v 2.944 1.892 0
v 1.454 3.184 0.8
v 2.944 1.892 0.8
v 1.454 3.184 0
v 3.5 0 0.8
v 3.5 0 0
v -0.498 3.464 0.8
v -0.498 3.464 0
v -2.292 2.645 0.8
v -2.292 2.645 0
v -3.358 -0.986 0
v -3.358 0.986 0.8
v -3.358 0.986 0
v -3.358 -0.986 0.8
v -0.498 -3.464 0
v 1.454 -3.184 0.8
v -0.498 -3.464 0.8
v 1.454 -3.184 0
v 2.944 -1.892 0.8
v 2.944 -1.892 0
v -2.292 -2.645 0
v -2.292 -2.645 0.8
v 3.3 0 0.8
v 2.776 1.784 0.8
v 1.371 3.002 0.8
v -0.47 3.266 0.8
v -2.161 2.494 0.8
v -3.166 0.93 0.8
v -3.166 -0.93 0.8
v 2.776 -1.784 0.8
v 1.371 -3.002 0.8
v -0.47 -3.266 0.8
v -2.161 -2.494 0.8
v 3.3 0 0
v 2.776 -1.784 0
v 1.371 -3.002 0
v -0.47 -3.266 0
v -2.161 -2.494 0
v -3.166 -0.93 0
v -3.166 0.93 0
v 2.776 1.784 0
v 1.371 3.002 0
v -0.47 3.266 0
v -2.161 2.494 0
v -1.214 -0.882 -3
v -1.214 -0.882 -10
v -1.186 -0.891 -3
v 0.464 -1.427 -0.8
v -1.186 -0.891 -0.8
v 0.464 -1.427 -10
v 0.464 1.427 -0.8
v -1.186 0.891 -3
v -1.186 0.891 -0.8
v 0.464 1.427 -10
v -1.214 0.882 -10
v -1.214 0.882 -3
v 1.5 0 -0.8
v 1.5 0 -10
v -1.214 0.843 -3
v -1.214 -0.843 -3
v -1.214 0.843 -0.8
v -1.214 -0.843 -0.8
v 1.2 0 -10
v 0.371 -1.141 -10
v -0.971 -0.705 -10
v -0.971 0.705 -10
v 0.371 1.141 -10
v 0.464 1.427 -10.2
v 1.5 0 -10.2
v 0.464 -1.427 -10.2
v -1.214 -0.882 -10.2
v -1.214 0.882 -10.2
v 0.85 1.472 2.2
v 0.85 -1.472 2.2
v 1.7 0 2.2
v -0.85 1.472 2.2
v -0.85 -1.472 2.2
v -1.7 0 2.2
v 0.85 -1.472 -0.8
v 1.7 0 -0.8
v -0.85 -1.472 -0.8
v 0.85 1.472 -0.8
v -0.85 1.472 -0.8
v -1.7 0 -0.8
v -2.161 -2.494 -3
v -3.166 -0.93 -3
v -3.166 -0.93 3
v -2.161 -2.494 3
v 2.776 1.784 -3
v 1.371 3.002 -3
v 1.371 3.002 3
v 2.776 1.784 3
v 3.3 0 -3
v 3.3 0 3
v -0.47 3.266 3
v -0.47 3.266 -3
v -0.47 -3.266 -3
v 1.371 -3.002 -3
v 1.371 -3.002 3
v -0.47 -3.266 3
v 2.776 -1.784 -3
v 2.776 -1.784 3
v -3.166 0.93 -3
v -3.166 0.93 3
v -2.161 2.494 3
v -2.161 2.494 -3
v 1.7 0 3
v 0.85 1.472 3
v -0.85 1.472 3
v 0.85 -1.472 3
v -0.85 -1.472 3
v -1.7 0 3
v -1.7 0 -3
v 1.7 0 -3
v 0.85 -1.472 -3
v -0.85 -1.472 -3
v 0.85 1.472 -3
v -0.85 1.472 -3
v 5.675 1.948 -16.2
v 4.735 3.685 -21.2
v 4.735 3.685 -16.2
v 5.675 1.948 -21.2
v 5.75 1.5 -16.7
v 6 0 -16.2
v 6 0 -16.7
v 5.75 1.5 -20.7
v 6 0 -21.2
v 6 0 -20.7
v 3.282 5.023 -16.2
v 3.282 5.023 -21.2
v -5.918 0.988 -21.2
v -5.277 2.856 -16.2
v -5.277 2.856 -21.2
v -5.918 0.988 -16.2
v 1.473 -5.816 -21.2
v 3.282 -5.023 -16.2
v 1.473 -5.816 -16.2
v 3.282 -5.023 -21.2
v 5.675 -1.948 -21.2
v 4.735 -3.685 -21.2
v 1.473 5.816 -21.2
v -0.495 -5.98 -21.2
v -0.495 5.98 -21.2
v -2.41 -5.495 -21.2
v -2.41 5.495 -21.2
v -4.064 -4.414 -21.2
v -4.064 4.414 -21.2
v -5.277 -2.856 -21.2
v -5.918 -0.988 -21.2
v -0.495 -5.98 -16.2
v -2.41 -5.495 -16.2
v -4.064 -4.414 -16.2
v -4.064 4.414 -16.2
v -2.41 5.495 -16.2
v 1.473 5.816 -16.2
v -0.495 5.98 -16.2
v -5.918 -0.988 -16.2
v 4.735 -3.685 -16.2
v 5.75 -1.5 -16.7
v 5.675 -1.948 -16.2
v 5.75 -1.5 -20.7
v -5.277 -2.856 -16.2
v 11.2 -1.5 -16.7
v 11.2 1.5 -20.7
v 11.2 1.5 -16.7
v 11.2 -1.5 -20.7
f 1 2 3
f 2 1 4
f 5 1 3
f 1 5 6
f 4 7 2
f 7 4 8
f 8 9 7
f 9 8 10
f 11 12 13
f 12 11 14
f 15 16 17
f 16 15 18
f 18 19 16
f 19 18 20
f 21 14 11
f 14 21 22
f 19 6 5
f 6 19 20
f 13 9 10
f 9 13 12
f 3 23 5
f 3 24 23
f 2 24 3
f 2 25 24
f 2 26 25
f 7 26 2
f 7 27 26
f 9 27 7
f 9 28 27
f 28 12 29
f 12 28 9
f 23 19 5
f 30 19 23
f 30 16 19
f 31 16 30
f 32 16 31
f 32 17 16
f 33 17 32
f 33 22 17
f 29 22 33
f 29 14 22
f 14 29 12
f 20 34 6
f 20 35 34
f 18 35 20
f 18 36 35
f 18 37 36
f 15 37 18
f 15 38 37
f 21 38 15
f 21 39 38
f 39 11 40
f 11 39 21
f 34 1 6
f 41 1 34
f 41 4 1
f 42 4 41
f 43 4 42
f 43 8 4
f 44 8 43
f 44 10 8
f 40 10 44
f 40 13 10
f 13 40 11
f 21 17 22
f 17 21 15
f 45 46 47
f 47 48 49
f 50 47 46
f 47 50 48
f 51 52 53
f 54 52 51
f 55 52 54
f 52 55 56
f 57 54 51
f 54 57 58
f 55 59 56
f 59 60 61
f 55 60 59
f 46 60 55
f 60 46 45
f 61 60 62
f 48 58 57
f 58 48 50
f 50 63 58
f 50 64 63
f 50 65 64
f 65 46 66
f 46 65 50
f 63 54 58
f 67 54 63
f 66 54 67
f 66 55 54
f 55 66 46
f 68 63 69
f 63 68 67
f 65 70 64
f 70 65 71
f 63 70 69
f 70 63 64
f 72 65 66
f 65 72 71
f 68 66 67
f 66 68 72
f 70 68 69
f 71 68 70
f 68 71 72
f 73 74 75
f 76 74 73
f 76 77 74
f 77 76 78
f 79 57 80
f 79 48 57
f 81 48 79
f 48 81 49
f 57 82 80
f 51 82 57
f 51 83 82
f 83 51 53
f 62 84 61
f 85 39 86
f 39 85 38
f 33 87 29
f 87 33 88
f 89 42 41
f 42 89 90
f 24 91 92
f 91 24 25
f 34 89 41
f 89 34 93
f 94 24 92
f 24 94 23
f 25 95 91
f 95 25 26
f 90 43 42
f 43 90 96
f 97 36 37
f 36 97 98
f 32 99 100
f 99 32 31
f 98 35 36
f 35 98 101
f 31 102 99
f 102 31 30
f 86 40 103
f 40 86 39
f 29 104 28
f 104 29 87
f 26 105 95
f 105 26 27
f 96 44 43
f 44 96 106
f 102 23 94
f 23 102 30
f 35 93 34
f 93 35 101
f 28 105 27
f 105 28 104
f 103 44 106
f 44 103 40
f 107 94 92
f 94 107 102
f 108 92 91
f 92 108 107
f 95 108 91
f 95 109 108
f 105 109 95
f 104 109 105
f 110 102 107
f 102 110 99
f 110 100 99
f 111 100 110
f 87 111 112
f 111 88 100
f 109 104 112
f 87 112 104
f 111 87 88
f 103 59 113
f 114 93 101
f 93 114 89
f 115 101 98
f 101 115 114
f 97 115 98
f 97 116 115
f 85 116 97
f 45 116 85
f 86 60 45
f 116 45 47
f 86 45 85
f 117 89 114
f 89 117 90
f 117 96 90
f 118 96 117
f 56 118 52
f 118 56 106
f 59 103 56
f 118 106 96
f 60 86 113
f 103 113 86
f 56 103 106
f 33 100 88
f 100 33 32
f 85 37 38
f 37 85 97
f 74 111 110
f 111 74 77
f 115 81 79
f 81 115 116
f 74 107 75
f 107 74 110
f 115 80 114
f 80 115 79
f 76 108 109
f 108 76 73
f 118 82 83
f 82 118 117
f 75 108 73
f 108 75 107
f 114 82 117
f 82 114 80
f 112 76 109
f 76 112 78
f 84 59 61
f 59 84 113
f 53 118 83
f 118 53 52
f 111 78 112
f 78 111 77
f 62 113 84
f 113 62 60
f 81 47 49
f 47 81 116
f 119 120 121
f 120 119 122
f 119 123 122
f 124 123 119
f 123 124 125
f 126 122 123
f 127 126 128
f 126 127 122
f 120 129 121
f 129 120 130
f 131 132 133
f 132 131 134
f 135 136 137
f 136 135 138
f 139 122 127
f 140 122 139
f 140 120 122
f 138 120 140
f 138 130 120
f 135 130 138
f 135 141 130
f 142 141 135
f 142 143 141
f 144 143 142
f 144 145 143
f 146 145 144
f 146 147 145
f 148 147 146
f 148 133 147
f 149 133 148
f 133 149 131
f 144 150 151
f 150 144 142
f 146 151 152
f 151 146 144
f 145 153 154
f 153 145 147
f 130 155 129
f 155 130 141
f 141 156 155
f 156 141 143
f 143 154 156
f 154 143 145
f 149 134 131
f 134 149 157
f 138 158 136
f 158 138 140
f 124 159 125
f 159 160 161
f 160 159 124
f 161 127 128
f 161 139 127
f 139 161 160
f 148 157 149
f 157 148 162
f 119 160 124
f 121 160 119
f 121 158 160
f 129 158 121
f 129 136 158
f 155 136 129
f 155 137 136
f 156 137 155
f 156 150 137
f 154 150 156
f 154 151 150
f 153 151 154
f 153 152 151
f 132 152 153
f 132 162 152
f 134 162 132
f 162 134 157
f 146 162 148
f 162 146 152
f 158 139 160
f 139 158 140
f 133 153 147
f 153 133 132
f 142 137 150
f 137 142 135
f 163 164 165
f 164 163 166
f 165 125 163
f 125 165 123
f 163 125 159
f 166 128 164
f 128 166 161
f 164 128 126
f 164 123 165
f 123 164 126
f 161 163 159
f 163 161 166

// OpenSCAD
// Parameters
thread_diameter_mm = 3; //[1.5:6:0.1]
length_under_head_mm = 10; //[5:20:0.5]
head_diameter_mm = 5.5; //[3:11:0.1]
head_height_mm = 3; //[1.5:6:0.1]
hex_socket_af_mm = 2.5; //[1.5:4:0.1]
hex_socket_depth_mm = 1.6; //[0.8:3:0.1]
tip_cone_height_mm = 1; //[0.5:2:0.1]
overlap_mm = 0.8; //[0.2:2:0.1]
spacer_height_mm = 6; //[3:12:0.5]
spacer_wall_mm = 1.8; //[0.8:3.6:0.1]
washer_outer_diameter_mm = 7; //[4:14:0.1]
washer_thickness_mm = 0.8; //[0.4:1.6:0.1]
buzzer_diameter_mm = 12; //[6:24:0.5]
buzzer_height_mm = 5; //[2.5:10:0.5]
pin_socket_width_mm = 6; //[3:12:0.5]
pin_socket_depth_mm = 3; //[1.5:6:0.5]
pin_socket_height_mm = 4; //[2:8:0.5]

// PCB Spacer - complete geometry
module pcb_spacer() {
  color("Silver") {
    difference() {
      cylinder(r=thread_diameter_mm/2 + spacer_wall_mm, h=spacer_height_mm, center=true);
      translate([0, 0, -overlap_mm])
        cylinder(r=thread_diameter_mm/2 + (overlap_mm/4), h=spacer_height_mm + 2*overlap_mm, center=true);
    }
  }
}

// Screw and Washer - complete geometry
module screw_and_washer() {
  color("DimGray") {
    union() {
      // Screw shaft
      translate([0, 0, -length_under_head_mm/2])
        cylinder(r=thread_diameter_mm/2, h=length_under_head_mm, center=true);
      // Tip
      translate([0, 0, -length_under_head_mm - tip_cone_height_mm/2 + overlap_mm])
        cylinder(r1=thread_diameter_mm/2, r2=0, h=tip_cone_height_mm, center=true);
      // Head
      translate([0, 0, head_height_mm/2 - overlap_mm])
        cylinder(r=head_diameter_mm/2, h=head_height_mm, center=true);
      // Hex socket
      translate([0, 0, head_height_mm - hex_socket_depth_mm/2 - overlap_mm])
        difference() {
          cylinder(r=(hex_socket_af_mm/cos(30))/2, h=hex_socket_depth_mm, center=true);
        }
      // Washer
      translate([0, 0, -washer_thickness_mm/2 + overlap_mm])
        difference() {
          cylinder(r=washer_outer_diameter_mm/2, h=washer_thickness_mm, center=true);
          translate([0, 0, -overlap_mm])
            cylinder(r=thread_diameter_mm/2 + (overlap_mm/4), h=washer_thickness_mm + 2*overlap_mm, center=true);
        }
    }
  }
}

// Buzzer - complete geometry
module buzzer() {
  color("Black") {
    translate([0, 0, -length_under_head_mm - tip_cone_height_mm - spacer_height_mm - buzzer_height_mm/2 + overlap_mm])
      cylinder(r=buzzer_diameter_mm/2, h=buzzer_height_mm, center=true);
  }
}

// Pin Socket - complete geometry
module pin_socket() {
  color("Blue") {
    translate([buzzer_diameter_mm/2 + pin_socket_width_mm/2 - overlap_mm, 0, -length_under_head_mm - tip_cone_height_mm - spacer_height_mm - buzzer_height_mm/2 + overlap_mm])
      cube([pin_socket_width_mm, pin_socket_depth_mm, pin_socket_height_mm], center=true);
  }
}

// Assembly
module assembly() {
  screw_and_washer();
  pcb_spacer();
  buzzer();
  pin_socket();
}

assembly();
